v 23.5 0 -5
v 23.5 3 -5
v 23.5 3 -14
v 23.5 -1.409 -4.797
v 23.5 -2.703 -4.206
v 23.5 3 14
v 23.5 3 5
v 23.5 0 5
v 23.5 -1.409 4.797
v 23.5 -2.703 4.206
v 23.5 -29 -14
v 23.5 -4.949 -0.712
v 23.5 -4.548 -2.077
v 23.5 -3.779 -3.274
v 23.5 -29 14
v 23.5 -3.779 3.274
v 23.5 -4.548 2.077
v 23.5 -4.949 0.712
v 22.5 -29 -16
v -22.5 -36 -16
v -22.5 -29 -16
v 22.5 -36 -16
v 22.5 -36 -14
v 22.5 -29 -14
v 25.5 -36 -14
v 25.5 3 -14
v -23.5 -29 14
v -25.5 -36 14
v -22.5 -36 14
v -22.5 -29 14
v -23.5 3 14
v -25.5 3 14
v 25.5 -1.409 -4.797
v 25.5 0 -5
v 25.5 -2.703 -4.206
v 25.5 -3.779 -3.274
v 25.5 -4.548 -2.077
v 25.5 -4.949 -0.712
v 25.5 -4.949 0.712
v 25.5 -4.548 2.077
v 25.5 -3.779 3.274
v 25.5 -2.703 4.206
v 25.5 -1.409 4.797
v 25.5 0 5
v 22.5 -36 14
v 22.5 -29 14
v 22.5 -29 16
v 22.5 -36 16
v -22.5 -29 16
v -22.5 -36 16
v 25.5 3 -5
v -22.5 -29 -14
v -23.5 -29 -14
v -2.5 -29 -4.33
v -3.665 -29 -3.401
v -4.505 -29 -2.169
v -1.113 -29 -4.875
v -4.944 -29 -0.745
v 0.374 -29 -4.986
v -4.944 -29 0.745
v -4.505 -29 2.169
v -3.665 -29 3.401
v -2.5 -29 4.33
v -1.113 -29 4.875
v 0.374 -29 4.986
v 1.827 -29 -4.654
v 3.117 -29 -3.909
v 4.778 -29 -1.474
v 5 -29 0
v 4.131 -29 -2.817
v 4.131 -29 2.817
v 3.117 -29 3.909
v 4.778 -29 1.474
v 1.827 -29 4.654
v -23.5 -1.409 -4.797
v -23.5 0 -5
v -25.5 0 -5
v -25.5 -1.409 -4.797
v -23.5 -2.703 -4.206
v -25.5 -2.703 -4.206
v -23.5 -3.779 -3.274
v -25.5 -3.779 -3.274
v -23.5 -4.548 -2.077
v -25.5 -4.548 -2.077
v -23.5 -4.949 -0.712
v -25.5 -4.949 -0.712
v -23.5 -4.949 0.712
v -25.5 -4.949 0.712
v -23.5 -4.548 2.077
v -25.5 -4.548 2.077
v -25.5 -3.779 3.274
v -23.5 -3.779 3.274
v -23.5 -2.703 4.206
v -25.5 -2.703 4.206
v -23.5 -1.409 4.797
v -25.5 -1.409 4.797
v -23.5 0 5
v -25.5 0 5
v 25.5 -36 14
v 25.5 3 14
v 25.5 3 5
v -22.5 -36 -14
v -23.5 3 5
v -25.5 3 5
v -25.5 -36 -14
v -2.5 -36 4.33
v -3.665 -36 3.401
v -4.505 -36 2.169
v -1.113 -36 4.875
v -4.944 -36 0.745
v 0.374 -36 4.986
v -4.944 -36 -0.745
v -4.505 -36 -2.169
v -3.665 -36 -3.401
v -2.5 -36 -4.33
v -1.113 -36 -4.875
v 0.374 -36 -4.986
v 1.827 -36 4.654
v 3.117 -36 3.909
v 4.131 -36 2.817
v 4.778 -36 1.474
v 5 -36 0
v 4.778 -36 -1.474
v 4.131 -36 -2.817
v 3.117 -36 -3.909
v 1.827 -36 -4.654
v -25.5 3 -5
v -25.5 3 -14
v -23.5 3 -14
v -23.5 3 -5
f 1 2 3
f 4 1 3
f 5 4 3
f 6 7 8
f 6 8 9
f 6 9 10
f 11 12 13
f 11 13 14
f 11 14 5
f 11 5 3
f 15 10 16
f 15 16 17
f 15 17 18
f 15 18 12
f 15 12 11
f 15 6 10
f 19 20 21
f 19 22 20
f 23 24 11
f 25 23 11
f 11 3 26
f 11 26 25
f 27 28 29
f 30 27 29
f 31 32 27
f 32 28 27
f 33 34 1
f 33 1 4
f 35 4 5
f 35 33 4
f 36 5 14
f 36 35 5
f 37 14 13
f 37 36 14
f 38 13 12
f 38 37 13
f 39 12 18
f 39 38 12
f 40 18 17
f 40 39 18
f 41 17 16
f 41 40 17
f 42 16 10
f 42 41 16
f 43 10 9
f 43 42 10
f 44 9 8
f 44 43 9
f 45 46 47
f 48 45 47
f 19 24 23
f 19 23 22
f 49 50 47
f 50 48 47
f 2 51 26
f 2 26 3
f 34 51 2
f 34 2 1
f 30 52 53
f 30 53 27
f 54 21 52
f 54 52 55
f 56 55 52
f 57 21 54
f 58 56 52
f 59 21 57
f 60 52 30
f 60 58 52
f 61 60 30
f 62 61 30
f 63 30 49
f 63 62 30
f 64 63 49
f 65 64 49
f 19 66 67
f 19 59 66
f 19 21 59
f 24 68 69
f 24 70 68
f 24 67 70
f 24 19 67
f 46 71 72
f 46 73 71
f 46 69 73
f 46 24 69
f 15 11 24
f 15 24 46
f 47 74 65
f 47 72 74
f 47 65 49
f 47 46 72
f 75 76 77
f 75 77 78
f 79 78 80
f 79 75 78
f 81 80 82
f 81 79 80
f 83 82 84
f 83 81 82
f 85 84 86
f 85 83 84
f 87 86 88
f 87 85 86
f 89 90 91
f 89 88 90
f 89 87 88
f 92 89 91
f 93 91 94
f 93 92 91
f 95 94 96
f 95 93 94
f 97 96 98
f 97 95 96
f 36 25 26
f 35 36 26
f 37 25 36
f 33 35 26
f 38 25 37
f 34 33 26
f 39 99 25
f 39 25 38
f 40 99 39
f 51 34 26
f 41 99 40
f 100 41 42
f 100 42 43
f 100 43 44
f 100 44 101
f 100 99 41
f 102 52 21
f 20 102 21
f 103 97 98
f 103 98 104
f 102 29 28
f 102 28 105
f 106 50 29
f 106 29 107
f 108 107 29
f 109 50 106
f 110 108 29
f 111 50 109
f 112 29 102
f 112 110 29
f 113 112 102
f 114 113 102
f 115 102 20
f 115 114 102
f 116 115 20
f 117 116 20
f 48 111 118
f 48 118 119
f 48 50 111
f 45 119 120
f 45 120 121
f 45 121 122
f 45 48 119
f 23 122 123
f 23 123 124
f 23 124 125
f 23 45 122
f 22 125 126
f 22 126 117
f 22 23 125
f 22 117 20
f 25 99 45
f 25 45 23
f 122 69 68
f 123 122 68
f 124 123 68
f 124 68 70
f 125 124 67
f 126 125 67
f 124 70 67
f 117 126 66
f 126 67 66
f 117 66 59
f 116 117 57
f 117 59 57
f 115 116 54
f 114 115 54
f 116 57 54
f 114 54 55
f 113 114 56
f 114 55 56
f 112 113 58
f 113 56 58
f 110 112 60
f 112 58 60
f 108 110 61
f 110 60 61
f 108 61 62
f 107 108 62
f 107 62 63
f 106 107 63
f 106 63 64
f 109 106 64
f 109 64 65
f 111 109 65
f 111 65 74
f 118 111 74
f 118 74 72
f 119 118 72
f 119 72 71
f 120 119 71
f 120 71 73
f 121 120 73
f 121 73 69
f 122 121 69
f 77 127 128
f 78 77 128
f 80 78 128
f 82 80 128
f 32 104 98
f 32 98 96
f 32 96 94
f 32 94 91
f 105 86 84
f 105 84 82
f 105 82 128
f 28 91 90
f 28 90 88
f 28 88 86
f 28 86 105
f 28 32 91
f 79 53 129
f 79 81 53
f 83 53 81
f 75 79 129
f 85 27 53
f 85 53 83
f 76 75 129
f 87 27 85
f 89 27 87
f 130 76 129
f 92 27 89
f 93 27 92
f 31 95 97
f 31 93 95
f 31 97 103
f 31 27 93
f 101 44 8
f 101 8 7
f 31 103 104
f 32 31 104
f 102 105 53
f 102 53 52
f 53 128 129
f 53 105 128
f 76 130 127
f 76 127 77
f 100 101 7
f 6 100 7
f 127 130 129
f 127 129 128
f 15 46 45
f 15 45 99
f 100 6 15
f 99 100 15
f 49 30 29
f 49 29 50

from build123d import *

# Parameters (mm, degrees)
BOSS_EXTRUDE1_DEPTH = 14
BOSS_EXTRUDE2_DEPTH = 22.5
CUT_EXTRUDE1_DEPTH  = 52
SKETCH4_R           = 5
CUT_EXTRUDE2_DEPTH  = 8


with BuildPart() as part:
    # Sketch1 → Boss-Extrude1 (new body, symmetric)
    with BuildSketch(Plane.XY):
        Polygon((-25.5, 3), (-25.5, -36), (25.5, -36), (25.5, 3), (23.5, 3), (23.5, -29), (-23.5, -29), (-23.5, 3), align=None)
    extrude(amount=BOSS_EXTRUDE1_DEPTH, both=True)

    # Sketch2 → Boss-Extrude2 (add, symmetric)
    with BuildSketch(Plane(origin=(0, 0, 0), x_dir=(0, 0, -1), z_dir=(1, 0, 0))):
        Polygon((-14, -36), (-16, -36), (-16, -29), (-13, -29), (-13, -33), (-14, -33), align=None)
    boss_extrude2 = extrude(amount=BOSS_EXTRUDE2_DEPTH, both=True)

    # Mirror1: Boss-Extrude2 across plane
    add(boss_extrude2.mirror(Plane.XY))

    # Sketch3 → Cut-Extrude1 (cut, through all)
    with BuildSketch(Plane(origin=(25.5, 0, 0), x_dir=(0, 0, -1), z_dir=(1, 0, 0))):
        with BuildLine():
            Line((-5, 0), (-5, 3))
            Line((-5, 3), (5, 3))
            Line((5, 3), (5, 0))
            ThreePointArc((5, 0), (0, -5), (-5, 0))
        make_face()
    extrude(amount=-CUT_EXTRUDE1_DEPTH, mode=Mode.SUBTRACT)

    # Sketch4 → Cut-Extrude2 (cut, through all)
    with BuildSketch(Plane(origin=(0, -29, 0), x_dir=(1, 0, 0), z_dir=(0, 1, 0))):
        Circle(SKETCH4_R)
    extrude(amount=-CUT_EXTRUDE2_DEPTH, mode=Mode.SUBTRACT)


solid = part.part
